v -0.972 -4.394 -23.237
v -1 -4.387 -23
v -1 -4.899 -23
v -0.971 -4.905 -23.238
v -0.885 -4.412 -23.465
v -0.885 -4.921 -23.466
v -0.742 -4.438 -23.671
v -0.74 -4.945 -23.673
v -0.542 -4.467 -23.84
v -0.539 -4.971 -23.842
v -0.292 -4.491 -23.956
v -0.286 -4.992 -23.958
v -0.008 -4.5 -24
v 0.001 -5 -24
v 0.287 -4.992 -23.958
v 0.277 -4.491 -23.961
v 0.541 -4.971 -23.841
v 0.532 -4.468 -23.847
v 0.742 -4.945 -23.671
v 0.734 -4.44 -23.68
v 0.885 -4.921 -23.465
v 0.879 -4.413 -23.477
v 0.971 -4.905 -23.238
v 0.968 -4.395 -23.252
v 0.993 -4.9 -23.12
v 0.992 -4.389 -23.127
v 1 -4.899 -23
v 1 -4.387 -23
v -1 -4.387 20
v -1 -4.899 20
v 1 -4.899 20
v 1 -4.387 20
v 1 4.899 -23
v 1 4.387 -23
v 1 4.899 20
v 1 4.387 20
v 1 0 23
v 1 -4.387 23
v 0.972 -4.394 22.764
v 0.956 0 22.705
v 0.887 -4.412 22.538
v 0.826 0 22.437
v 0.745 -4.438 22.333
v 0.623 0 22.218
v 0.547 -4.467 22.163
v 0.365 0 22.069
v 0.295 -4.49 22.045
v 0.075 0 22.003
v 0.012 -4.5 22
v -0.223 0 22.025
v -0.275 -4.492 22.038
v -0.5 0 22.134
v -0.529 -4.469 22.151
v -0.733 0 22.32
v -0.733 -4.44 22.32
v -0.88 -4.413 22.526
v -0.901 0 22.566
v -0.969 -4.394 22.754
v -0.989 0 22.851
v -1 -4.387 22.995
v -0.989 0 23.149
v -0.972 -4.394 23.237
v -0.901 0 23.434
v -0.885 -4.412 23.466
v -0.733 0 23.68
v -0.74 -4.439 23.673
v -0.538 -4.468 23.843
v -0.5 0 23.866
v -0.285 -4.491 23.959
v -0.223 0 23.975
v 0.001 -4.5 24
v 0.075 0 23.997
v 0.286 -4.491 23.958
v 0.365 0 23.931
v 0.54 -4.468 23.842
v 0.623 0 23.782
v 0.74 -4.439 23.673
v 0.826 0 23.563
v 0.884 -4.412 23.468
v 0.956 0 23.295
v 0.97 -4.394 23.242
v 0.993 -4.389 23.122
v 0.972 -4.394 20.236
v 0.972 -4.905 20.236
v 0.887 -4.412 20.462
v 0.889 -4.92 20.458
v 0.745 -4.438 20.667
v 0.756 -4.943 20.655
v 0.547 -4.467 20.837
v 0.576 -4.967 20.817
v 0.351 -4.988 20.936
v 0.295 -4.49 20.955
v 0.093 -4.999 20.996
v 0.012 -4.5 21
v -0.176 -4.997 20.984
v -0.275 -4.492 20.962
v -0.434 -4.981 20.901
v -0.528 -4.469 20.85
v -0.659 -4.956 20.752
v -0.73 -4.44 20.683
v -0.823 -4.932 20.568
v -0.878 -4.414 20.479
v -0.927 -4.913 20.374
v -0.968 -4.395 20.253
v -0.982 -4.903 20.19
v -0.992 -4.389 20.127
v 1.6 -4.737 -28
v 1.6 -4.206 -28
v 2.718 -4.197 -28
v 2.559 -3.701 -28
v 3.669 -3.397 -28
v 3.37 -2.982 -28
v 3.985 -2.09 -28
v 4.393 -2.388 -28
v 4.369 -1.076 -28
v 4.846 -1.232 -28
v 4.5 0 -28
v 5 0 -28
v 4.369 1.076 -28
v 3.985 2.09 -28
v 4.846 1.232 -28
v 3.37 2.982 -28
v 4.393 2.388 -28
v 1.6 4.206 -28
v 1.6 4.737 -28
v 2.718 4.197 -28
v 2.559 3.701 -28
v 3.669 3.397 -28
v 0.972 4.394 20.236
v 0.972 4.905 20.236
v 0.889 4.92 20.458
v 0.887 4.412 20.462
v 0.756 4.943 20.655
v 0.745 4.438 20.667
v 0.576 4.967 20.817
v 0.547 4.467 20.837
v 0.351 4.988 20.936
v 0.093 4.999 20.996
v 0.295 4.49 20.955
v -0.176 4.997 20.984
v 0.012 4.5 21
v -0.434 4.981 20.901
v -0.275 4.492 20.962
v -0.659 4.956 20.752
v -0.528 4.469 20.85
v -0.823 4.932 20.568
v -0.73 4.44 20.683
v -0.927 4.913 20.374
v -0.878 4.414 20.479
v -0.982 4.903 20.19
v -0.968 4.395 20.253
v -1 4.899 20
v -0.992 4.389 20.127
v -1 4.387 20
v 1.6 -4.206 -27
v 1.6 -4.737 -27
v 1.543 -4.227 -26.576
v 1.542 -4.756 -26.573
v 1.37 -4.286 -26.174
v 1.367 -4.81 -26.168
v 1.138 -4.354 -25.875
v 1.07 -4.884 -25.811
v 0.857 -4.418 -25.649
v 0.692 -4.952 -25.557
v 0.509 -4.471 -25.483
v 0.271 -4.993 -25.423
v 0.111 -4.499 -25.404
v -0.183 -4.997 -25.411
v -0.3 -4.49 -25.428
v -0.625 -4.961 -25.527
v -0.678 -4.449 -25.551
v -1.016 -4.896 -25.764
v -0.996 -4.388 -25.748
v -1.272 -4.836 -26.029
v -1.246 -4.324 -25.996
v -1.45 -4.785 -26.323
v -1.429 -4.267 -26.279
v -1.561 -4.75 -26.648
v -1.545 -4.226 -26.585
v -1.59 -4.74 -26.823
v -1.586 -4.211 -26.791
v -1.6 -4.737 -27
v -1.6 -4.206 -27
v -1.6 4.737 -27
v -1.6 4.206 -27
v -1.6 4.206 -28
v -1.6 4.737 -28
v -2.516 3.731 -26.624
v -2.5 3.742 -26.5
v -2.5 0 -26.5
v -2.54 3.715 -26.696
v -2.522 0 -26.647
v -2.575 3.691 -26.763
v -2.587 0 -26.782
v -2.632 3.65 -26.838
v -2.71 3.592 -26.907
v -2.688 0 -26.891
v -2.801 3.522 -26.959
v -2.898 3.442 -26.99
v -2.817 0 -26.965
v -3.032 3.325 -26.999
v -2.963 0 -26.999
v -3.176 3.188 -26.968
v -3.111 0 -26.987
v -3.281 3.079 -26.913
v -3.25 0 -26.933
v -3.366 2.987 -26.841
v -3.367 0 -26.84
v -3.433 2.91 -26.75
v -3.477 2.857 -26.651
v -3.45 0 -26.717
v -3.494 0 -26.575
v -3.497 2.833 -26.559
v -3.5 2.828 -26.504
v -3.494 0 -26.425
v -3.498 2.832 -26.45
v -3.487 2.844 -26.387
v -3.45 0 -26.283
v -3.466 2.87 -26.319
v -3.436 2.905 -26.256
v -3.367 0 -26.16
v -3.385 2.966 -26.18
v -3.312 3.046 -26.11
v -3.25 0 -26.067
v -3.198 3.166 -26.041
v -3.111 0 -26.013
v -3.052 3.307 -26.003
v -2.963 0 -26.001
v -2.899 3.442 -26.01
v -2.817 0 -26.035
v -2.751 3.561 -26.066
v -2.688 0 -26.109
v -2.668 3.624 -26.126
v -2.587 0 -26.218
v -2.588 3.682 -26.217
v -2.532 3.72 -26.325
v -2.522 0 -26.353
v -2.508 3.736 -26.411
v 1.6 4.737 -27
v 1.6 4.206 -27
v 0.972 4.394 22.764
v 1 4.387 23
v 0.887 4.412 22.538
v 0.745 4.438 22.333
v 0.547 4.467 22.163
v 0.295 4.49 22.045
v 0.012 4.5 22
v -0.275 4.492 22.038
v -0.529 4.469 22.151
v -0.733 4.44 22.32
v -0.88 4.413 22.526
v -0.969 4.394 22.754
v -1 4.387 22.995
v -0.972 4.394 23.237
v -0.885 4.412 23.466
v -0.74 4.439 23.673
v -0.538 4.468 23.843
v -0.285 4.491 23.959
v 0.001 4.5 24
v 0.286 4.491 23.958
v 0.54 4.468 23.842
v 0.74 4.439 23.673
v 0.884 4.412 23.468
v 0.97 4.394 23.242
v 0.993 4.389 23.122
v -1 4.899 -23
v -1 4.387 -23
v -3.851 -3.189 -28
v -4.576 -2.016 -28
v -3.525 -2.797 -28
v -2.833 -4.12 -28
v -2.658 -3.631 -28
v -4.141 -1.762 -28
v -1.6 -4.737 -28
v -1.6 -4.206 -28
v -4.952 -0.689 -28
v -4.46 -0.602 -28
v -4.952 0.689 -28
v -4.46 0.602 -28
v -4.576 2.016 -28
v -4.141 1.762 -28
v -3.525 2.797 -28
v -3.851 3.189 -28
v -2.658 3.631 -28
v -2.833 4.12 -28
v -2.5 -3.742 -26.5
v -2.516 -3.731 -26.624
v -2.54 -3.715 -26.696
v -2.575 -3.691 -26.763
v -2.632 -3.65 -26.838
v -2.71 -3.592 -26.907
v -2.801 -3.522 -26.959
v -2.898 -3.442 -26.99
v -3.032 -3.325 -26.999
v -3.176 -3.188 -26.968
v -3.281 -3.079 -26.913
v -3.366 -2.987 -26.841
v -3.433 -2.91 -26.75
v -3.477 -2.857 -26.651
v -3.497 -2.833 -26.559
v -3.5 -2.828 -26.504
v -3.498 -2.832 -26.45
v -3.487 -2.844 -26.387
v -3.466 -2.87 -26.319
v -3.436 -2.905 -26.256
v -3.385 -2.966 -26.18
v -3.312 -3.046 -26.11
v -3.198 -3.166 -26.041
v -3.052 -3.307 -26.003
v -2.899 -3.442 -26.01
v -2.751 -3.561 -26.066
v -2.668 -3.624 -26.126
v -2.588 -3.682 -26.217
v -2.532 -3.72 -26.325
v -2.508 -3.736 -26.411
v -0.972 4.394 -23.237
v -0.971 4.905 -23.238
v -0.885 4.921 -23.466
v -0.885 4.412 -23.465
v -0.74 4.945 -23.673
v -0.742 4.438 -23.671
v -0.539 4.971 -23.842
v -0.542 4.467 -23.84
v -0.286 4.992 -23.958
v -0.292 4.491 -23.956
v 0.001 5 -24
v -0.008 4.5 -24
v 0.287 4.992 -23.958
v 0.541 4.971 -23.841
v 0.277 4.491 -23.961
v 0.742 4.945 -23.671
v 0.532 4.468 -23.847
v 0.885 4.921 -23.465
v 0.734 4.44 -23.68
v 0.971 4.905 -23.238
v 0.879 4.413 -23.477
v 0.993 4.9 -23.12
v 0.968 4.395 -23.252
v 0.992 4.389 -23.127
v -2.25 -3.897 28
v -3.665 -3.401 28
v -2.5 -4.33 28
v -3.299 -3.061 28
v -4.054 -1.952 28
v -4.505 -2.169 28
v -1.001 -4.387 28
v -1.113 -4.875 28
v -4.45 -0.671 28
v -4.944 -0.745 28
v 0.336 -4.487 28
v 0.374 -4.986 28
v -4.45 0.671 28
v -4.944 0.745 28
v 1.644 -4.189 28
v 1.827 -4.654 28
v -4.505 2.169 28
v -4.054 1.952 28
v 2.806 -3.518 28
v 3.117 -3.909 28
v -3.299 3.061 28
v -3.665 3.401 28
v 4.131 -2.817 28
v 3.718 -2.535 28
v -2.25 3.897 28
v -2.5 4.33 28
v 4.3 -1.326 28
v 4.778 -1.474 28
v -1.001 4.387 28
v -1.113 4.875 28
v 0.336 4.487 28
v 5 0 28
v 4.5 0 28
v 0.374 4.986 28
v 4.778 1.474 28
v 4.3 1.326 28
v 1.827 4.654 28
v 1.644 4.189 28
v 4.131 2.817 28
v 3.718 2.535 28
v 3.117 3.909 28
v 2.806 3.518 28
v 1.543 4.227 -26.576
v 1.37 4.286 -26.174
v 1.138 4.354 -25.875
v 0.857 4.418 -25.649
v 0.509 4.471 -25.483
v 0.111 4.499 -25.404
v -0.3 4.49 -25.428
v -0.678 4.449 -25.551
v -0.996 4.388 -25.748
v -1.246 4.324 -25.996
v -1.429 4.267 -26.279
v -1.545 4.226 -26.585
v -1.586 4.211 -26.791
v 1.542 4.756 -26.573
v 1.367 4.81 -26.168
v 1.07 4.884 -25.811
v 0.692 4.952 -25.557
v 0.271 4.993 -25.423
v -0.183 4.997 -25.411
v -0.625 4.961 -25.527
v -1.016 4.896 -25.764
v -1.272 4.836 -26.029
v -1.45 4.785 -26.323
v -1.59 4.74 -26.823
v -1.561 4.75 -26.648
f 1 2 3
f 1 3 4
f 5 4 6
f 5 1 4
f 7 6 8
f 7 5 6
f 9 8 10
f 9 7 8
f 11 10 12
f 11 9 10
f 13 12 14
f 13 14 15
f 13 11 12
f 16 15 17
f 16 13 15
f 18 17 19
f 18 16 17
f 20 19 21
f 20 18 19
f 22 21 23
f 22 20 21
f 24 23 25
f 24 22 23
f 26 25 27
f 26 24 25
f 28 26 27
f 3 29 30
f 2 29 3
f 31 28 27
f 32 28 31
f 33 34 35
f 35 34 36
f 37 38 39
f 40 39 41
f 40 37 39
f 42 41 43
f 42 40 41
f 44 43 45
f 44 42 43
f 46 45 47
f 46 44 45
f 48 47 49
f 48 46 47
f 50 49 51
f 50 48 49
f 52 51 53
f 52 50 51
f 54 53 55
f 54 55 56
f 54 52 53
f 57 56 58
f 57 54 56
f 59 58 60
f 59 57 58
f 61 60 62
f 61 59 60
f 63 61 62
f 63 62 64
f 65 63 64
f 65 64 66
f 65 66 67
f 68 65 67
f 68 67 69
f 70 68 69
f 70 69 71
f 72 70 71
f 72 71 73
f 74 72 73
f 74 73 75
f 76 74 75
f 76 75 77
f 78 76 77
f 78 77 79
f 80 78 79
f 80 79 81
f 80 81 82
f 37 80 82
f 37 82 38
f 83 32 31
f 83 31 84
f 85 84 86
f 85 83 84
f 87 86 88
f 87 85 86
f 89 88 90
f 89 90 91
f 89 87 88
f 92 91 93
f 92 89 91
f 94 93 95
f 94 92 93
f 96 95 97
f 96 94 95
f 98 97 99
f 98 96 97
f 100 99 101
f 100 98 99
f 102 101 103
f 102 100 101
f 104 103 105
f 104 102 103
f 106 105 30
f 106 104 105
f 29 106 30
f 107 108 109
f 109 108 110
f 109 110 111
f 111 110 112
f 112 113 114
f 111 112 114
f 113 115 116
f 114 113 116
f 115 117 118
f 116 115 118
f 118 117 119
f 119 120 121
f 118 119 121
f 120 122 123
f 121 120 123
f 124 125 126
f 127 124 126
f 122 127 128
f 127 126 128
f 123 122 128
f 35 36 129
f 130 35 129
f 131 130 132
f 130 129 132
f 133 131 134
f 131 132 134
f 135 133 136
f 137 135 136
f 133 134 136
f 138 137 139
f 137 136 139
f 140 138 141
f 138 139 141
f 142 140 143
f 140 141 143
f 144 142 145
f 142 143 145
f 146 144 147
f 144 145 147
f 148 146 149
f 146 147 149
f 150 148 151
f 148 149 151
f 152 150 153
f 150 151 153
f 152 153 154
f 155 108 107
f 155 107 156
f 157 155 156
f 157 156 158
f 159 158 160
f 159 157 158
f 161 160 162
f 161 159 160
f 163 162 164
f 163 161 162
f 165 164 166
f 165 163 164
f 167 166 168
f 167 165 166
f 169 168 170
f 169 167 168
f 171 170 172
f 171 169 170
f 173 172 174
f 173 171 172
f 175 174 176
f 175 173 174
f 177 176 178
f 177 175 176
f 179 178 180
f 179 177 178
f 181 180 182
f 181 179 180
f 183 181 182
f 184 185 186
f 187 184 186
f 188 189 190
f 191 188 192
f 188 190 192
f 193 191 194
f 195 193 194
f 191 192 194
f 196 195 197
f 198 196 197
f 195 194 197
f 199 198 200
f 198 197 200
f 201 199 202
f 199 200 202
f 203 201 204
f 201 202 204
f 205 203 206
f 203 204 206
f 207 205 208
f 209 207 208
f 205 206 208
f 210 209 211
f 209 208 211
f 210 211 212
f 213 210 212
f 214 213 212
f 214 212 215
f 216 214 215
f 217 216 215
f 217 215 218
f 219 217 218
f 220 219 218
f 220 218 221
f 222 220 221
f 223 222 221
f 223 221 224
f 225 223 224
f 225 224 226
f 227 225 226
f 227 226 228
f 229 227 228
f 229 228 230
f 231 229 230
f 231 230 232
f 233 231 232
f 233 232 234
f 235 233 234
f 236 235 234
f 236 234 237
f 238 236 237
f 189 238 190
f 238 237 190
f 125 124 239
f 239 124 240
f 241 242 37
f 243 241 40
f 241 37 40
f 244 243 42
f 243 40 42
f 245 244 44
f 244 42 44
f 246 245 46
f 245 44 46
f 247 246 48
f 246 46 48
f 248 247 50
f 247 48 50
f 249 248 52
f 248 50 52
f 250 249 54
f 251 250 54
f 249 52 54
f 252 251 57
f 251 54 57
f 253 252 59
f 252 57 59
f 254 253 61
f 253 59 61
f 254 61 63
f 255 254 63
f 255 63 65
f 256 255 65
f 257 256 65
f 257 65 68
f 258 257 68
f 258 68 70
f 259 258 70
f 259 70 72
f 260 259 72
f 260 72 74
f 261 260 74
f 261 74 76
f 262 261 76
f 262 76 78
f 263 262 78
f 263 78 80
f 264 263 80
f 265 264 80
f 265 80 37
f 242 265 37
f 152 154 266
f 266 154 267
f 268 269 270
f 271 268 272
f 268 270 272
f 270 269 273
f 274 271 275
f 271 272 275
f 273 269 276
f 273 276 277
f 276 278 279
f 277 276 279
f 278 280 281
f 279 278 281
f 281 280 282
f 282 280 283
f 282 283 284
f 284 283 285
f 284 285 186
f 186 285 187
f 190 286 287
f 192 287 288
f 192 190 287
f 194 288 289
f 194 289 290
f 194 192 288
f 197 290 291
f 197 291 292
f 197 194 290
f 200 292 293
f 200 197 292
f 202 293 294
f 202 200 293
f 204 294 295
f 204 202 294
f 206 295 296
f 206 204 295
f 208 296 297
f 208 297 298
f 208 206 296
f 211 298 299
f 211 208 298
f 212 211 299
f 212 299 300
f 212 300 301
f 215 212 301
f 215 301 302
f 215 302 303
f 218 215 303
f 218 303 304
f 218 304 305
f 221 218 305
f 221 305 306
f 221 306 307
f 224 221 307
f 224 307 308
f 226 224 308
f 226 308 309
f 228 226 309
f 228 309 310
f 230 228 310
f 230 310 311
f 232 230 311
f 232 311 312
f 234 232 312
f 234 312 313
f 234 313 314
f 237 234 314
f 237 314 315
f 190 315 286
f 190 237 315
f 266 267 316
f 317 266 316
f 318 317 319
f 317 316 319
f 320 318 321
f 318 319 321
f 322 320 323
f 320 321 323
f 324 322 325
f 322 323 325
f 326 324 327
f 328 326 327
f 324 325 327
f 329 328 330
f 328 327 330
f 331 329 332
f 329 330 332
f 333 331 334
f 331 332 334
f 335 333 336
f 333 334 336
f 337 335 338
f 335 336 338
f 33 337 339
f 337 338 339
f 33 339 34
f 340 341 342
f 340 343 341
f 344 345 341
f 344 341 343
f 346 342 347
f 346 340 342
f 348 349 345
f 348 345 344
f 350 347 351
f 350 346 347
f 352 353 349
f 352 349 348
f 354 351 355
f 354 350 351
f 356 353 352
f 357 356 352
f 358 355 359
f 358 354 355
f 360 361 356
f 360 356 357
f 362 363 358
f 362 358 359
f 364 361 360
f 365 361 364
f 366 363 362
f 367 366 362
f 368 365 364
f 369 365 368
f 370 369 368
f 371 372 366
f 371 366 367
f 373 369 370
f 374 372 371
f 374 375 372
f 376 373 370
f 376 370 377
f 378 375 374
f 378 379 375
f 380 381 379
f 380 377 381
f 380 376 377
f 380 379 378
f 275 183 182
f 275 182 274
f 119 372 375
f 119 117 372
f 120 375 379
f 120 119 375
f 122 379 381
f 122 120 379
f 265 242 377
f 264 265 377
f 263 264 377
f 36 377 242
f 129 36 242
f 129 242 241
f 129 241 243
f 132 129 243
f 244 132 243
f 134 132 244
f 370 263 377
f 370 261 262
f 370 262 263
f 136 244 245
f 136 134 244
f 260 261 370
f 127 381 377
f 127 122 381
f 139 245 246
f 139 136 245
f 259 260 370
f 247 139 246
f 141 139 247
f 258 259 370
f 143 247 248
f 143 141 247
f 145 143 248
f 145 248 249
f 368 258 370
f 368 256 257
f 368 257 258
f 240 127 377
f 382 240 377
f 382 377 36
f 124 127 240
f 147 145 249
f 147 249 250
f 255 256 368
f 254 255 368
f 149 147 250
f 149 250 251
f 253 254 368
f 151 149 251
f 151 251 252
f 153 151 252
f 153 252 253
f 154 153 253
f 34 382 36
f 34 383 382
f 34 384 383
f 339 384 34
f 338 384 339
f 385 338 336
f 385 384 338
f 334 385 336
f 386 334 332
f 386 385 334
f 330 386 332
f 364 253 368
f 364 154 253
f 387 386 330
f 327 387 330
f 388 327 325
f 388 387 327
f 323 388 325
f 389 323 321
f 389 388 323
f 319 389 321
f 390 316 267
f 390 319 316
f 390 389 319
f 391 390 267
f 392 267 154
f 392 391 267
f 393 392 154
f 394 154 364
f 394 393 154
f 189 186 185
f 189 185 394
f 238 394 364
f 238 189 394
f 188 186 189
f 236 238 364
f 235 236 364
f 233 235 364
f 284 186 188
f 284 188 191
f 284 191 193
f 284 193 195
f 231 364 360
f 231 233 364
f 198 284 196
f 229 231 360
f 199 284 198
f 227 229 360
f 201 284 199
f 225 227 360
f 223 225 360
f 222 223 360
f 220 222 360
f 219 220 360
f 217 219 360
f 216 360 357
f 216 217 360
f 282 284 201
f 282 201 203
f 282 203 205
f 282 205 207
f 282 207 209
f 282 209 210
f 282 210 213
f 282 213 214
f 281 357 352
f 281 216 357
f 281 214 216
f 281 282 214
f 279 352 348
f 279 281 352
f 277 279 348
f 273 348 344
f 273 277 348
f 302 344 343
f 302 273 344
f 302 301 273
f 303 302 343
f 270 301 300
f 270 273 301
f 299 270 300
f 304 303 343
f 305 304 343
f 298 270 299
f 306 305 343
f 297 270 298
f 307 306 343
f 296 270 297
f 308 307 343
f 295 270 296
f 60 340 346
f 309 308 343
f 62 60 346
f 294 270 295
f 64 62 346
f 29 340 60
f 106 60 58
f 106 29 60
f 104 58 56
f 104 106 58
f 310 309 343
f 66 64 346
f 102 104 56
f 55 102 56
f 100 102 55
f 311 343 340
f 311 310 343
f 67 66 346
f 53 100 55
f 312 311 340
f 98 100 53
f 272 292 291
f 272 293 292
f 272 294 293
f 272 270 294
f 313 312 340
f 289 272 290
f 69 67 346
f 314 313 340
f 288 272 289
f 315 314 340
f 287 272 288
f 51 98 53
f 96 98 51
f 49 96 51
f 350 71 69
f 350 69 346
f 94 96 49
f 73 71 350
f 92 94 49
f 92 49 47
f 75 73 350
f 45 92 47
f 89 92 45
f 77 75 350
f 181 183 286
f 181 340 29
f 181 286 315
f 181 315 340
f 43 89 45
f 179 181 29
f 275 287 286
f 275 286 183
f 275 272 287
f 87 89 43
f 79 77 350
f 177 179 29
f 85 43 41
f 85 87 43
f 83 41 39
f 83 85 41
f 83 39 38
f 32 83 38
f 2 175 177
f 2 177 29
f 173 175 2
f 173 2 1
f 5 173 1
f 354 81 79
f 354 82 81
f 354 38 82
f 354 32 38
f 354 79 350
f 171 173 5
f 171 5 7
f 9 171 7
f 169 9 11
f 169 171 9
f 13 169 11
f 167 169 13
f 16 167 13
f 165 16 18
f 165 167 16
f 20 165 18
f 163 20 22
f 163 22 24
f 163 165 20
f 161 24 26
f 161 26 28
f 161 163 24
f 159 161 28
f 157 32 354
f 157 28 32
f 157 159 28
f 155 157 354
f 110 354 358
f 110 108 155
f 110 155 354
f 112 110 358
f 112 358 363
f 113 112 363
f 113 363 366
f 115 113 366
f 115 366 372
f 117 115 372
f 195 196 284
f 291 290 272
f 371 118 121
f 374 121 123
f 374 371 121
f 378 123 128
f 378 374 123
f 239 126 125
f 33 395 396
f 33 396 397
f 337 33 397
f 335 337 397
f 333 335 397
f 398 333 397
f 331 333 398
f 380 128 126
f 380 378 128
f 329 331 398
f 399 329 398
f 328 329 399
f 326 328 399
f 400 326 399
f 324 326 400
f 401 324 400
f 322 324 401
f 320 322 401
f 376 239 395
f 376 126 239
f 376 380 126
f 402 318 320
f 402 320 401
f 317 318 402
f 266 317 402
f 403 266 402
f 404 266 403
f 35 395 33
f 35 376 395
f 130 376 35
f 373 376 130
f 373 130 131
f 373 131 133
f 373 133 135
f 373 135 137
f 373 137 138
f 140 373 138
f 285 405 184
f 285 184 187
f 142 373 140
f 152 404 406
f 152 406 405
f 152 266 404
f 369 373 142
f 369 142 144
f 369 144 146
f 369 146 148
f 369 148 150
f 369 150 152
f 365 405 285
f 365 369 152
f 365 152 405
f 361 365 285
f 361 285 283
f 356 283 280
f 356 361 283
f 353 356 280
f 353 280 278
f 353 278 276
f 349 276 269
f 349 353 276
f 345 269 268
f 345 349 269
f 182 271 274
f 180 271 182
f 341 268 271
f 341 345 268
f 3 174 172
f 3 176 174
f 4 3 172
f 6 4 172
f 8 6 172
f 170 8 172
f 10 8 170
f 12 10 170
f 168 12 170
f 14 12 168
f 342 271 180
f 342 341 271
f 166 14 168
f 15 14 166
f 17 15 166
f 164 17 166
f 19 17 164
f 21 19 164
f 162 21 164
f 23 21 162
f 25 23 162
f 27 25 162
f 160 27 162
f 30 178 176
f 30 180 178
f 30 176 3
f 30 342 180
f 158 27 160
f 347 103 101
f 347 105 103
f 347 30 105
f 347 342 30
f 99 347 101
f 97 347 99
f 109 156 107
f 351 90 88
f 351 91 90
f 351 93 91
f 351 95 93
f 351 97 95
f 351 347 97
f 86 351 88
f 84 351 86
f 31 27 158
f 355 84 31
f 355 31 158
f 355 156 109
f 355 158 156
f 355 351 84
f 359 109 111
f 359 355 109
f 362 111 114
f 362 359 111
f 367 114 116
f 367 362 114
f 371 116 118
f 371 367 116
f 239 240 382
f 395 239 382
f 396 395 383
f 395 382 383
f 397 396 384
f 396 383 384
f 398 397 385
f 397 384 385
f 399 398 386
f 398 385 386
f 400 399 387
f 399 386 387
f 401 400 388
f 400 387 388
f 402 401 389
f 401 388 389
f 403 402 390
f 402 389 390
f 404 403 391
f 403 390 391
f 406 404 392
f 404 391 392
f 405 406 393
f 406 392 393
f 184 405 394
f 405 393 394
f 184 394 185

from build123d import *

# Parameters (mm, degrees)
ESQUISSE1_R                    = 5
ESQUISSE1_R_2                  = 4.5
BOSS_EXTRU_1_DEPTH             = 28
BOSS_EXTRU_2_REACH             = 7
ESQUISSE2_R                    = 1
ESQUISSE2_R_2                  = 0.5
BOSS_EXTRU_2_DIRECTION_2_REACH = 7
ENL_V_MAT_EXTRU_1_DEPTH        = 6
ENL_V_MAT_EXTRU_1_DEPTH_BACK   = 6
ENL_V_MAT_EXTRU_2_DEPTH        = 6.000000118
ENL_V_MAT_EXTRU_2_DEPTH_BACK   = 6.000000118


with BuildPart() as part:
    # Esquisse1 → Boss.-Extru.1 (new body, symmetric)
    with BuildSketch(Plane.XY):
        Circle(ESQUISSE1_R)
        Circle(ESQUISSE1_R_2, mode=Mode.SUBTRACT)
    extrude(amount=BOSS_EXTRU_1_DEPTH, both=True)

    # Esquisse2 → Boss.-Extru.2 (add, up to next)
    with BuildSketch(Plane(origin=(0, 0, 0), x_dir=(1, 0, 0), z_dir=(0, 1, 0)), mode=Mode.PRIVATE) as boss_extru_2_sk1:
        with Locations((0, -23)):
            Circle(ESQUISSE2_R)
    boss_extru_2_tool1 = extrude(boss_extru_2_sk1.sketch, amount=BOSS_EXTRU_2_REACH, mode=Mode.PRIVATE) - part.part
    add(boss_extru_2_tool1.solids().sort_by_distance((0, 0, 23))[0])
    # Esquisse2 → Boss.-Extru.2 (add, up to next)
    with BuildSketch(Plane(origin=(0, 0, 0), x_dir=(1, 0, 0), z_dir=(0, 1, 0)), mode=Mode.PRIVATE) as boss_extru_2_sk2:
        with Locations((-3, 26.5)):
            Circle(ESQUISSE2_R_2)
    boss_extru_2_tool2 = extrude(boss_extru_2_sk2.sketch, amount=BOSS_EXTRU_2_REACH, mode=Mode.PRIVATE) - part.part
    add(boss_extru_2_tool2.solids().sort_by_distance((-3, 0, -26.5))[0])

    # Esquisse2 → Boss.-Extru.2 direction 2 (add, up to next)
    with BuildSketch(Plane(origin=(0, 0, 0), x_dir=(1, 0, 0), z_dir=(0, 1, 0)), mode=Mode.PRIVATE) as boss_extru_2_direction_2_sk1:
        with Locations((0, -23)):
            Circle(ESQUISSE2_R)
    boss_extru_2_direction_2_tool1 = extrude(boss_extru_2_direction_2_sk1.sketch, amount=-BOSS_EXTRU_2_DIRECTION_2_REACH, mode=Mode.PRIVATE) - part.part
    add(boss_extru_2_direction_2_tool1.solids().sort_by_distance((0, 0, 23))[0])
    # Esquisse2 → Boss.-Extru.2 direction 2 (add, up to next)
    with BuildSketch(Plane(origin=(0, 0, 0), x_dir=(1, 0, 0), z_dir=(0, 1, 0)), mode=Mode.PRIVATE) as boss_extru_2_direction_2_sk2:
        with Locations((-3, 26.5)):
            Circle(ESQUISSE2_R_2)
    boss_extru_2_direction_2_tool2 = extrude(boss_extru_2_direction_2_sk2.sketch, amount=-BOSS_EXTRU_2_DIRECTION_2_REACH, mode=Mode.PRIVATE) - part.part
    add(boss_extru_2_direction_2_tool2.solids().sort_by_distance((-3, 0, -26.5))[0])

    # Esquisse3 → Enlèv. mat.-Extru.1 (cut, two sides)
    with BuildSketch(Plane(origin=(0, 0, 0), x_dir=(1, 0, 0), z_dir=(0, 1, 0))) as enl_v_mat_extru_1_sk:
        with BuildLine():
            Line((1, 23), (1, -20))
            ThreePointArc((1, -20), (0, -21), (-1, -20))
            Line((-1, -20), (-1, 23))
            ThreePointArc((-1, 23), (0, 24), (1, 23))
        make_face()
    extrude(amount=ENL_V_MAT_EXTRU_1_DEPTH, mode=Mode.SUBTRACT)
    extrude(enl_v_mat_extru_1_sk.sketch, amount=-ENL_V_MAT_EXTRU_1_DEPTH_BACK, mode=Mode.SUBTRACT)

    # Esquisse4 → Enlèv. mat.-Extru.2 (cut, two sides)
    with BuildSketch(Plane(origin=(0, 0, 0), x_dir=(1, 0, 0), z_dir=(0, 1, 0))) as enl_v_mat_extru_2_sk:
        with BuildLine():
            Line((-1.6, 27), (-1.6, 28))
            ThreePointArc((-1.6, 28), (0, 29.6), (1.6, 28))
            Line((1.6, 28), (1.6, 27))
            ThreePointArc((1.6, 27), (0, 25.4), (-1.6, 27))
        make_face()
    extrude(amount=ENL_V_MAT_EXTRU_2_DEPTH, mode=Mode.SUBTRACT)
    extrude(enl_v_mat_extru_2_sk.sketch, amount=-ENL_V_MAT_EXTRU_2_DEPTH_BACK, mode=Mode.SUBTRACT)


solid = part.part
